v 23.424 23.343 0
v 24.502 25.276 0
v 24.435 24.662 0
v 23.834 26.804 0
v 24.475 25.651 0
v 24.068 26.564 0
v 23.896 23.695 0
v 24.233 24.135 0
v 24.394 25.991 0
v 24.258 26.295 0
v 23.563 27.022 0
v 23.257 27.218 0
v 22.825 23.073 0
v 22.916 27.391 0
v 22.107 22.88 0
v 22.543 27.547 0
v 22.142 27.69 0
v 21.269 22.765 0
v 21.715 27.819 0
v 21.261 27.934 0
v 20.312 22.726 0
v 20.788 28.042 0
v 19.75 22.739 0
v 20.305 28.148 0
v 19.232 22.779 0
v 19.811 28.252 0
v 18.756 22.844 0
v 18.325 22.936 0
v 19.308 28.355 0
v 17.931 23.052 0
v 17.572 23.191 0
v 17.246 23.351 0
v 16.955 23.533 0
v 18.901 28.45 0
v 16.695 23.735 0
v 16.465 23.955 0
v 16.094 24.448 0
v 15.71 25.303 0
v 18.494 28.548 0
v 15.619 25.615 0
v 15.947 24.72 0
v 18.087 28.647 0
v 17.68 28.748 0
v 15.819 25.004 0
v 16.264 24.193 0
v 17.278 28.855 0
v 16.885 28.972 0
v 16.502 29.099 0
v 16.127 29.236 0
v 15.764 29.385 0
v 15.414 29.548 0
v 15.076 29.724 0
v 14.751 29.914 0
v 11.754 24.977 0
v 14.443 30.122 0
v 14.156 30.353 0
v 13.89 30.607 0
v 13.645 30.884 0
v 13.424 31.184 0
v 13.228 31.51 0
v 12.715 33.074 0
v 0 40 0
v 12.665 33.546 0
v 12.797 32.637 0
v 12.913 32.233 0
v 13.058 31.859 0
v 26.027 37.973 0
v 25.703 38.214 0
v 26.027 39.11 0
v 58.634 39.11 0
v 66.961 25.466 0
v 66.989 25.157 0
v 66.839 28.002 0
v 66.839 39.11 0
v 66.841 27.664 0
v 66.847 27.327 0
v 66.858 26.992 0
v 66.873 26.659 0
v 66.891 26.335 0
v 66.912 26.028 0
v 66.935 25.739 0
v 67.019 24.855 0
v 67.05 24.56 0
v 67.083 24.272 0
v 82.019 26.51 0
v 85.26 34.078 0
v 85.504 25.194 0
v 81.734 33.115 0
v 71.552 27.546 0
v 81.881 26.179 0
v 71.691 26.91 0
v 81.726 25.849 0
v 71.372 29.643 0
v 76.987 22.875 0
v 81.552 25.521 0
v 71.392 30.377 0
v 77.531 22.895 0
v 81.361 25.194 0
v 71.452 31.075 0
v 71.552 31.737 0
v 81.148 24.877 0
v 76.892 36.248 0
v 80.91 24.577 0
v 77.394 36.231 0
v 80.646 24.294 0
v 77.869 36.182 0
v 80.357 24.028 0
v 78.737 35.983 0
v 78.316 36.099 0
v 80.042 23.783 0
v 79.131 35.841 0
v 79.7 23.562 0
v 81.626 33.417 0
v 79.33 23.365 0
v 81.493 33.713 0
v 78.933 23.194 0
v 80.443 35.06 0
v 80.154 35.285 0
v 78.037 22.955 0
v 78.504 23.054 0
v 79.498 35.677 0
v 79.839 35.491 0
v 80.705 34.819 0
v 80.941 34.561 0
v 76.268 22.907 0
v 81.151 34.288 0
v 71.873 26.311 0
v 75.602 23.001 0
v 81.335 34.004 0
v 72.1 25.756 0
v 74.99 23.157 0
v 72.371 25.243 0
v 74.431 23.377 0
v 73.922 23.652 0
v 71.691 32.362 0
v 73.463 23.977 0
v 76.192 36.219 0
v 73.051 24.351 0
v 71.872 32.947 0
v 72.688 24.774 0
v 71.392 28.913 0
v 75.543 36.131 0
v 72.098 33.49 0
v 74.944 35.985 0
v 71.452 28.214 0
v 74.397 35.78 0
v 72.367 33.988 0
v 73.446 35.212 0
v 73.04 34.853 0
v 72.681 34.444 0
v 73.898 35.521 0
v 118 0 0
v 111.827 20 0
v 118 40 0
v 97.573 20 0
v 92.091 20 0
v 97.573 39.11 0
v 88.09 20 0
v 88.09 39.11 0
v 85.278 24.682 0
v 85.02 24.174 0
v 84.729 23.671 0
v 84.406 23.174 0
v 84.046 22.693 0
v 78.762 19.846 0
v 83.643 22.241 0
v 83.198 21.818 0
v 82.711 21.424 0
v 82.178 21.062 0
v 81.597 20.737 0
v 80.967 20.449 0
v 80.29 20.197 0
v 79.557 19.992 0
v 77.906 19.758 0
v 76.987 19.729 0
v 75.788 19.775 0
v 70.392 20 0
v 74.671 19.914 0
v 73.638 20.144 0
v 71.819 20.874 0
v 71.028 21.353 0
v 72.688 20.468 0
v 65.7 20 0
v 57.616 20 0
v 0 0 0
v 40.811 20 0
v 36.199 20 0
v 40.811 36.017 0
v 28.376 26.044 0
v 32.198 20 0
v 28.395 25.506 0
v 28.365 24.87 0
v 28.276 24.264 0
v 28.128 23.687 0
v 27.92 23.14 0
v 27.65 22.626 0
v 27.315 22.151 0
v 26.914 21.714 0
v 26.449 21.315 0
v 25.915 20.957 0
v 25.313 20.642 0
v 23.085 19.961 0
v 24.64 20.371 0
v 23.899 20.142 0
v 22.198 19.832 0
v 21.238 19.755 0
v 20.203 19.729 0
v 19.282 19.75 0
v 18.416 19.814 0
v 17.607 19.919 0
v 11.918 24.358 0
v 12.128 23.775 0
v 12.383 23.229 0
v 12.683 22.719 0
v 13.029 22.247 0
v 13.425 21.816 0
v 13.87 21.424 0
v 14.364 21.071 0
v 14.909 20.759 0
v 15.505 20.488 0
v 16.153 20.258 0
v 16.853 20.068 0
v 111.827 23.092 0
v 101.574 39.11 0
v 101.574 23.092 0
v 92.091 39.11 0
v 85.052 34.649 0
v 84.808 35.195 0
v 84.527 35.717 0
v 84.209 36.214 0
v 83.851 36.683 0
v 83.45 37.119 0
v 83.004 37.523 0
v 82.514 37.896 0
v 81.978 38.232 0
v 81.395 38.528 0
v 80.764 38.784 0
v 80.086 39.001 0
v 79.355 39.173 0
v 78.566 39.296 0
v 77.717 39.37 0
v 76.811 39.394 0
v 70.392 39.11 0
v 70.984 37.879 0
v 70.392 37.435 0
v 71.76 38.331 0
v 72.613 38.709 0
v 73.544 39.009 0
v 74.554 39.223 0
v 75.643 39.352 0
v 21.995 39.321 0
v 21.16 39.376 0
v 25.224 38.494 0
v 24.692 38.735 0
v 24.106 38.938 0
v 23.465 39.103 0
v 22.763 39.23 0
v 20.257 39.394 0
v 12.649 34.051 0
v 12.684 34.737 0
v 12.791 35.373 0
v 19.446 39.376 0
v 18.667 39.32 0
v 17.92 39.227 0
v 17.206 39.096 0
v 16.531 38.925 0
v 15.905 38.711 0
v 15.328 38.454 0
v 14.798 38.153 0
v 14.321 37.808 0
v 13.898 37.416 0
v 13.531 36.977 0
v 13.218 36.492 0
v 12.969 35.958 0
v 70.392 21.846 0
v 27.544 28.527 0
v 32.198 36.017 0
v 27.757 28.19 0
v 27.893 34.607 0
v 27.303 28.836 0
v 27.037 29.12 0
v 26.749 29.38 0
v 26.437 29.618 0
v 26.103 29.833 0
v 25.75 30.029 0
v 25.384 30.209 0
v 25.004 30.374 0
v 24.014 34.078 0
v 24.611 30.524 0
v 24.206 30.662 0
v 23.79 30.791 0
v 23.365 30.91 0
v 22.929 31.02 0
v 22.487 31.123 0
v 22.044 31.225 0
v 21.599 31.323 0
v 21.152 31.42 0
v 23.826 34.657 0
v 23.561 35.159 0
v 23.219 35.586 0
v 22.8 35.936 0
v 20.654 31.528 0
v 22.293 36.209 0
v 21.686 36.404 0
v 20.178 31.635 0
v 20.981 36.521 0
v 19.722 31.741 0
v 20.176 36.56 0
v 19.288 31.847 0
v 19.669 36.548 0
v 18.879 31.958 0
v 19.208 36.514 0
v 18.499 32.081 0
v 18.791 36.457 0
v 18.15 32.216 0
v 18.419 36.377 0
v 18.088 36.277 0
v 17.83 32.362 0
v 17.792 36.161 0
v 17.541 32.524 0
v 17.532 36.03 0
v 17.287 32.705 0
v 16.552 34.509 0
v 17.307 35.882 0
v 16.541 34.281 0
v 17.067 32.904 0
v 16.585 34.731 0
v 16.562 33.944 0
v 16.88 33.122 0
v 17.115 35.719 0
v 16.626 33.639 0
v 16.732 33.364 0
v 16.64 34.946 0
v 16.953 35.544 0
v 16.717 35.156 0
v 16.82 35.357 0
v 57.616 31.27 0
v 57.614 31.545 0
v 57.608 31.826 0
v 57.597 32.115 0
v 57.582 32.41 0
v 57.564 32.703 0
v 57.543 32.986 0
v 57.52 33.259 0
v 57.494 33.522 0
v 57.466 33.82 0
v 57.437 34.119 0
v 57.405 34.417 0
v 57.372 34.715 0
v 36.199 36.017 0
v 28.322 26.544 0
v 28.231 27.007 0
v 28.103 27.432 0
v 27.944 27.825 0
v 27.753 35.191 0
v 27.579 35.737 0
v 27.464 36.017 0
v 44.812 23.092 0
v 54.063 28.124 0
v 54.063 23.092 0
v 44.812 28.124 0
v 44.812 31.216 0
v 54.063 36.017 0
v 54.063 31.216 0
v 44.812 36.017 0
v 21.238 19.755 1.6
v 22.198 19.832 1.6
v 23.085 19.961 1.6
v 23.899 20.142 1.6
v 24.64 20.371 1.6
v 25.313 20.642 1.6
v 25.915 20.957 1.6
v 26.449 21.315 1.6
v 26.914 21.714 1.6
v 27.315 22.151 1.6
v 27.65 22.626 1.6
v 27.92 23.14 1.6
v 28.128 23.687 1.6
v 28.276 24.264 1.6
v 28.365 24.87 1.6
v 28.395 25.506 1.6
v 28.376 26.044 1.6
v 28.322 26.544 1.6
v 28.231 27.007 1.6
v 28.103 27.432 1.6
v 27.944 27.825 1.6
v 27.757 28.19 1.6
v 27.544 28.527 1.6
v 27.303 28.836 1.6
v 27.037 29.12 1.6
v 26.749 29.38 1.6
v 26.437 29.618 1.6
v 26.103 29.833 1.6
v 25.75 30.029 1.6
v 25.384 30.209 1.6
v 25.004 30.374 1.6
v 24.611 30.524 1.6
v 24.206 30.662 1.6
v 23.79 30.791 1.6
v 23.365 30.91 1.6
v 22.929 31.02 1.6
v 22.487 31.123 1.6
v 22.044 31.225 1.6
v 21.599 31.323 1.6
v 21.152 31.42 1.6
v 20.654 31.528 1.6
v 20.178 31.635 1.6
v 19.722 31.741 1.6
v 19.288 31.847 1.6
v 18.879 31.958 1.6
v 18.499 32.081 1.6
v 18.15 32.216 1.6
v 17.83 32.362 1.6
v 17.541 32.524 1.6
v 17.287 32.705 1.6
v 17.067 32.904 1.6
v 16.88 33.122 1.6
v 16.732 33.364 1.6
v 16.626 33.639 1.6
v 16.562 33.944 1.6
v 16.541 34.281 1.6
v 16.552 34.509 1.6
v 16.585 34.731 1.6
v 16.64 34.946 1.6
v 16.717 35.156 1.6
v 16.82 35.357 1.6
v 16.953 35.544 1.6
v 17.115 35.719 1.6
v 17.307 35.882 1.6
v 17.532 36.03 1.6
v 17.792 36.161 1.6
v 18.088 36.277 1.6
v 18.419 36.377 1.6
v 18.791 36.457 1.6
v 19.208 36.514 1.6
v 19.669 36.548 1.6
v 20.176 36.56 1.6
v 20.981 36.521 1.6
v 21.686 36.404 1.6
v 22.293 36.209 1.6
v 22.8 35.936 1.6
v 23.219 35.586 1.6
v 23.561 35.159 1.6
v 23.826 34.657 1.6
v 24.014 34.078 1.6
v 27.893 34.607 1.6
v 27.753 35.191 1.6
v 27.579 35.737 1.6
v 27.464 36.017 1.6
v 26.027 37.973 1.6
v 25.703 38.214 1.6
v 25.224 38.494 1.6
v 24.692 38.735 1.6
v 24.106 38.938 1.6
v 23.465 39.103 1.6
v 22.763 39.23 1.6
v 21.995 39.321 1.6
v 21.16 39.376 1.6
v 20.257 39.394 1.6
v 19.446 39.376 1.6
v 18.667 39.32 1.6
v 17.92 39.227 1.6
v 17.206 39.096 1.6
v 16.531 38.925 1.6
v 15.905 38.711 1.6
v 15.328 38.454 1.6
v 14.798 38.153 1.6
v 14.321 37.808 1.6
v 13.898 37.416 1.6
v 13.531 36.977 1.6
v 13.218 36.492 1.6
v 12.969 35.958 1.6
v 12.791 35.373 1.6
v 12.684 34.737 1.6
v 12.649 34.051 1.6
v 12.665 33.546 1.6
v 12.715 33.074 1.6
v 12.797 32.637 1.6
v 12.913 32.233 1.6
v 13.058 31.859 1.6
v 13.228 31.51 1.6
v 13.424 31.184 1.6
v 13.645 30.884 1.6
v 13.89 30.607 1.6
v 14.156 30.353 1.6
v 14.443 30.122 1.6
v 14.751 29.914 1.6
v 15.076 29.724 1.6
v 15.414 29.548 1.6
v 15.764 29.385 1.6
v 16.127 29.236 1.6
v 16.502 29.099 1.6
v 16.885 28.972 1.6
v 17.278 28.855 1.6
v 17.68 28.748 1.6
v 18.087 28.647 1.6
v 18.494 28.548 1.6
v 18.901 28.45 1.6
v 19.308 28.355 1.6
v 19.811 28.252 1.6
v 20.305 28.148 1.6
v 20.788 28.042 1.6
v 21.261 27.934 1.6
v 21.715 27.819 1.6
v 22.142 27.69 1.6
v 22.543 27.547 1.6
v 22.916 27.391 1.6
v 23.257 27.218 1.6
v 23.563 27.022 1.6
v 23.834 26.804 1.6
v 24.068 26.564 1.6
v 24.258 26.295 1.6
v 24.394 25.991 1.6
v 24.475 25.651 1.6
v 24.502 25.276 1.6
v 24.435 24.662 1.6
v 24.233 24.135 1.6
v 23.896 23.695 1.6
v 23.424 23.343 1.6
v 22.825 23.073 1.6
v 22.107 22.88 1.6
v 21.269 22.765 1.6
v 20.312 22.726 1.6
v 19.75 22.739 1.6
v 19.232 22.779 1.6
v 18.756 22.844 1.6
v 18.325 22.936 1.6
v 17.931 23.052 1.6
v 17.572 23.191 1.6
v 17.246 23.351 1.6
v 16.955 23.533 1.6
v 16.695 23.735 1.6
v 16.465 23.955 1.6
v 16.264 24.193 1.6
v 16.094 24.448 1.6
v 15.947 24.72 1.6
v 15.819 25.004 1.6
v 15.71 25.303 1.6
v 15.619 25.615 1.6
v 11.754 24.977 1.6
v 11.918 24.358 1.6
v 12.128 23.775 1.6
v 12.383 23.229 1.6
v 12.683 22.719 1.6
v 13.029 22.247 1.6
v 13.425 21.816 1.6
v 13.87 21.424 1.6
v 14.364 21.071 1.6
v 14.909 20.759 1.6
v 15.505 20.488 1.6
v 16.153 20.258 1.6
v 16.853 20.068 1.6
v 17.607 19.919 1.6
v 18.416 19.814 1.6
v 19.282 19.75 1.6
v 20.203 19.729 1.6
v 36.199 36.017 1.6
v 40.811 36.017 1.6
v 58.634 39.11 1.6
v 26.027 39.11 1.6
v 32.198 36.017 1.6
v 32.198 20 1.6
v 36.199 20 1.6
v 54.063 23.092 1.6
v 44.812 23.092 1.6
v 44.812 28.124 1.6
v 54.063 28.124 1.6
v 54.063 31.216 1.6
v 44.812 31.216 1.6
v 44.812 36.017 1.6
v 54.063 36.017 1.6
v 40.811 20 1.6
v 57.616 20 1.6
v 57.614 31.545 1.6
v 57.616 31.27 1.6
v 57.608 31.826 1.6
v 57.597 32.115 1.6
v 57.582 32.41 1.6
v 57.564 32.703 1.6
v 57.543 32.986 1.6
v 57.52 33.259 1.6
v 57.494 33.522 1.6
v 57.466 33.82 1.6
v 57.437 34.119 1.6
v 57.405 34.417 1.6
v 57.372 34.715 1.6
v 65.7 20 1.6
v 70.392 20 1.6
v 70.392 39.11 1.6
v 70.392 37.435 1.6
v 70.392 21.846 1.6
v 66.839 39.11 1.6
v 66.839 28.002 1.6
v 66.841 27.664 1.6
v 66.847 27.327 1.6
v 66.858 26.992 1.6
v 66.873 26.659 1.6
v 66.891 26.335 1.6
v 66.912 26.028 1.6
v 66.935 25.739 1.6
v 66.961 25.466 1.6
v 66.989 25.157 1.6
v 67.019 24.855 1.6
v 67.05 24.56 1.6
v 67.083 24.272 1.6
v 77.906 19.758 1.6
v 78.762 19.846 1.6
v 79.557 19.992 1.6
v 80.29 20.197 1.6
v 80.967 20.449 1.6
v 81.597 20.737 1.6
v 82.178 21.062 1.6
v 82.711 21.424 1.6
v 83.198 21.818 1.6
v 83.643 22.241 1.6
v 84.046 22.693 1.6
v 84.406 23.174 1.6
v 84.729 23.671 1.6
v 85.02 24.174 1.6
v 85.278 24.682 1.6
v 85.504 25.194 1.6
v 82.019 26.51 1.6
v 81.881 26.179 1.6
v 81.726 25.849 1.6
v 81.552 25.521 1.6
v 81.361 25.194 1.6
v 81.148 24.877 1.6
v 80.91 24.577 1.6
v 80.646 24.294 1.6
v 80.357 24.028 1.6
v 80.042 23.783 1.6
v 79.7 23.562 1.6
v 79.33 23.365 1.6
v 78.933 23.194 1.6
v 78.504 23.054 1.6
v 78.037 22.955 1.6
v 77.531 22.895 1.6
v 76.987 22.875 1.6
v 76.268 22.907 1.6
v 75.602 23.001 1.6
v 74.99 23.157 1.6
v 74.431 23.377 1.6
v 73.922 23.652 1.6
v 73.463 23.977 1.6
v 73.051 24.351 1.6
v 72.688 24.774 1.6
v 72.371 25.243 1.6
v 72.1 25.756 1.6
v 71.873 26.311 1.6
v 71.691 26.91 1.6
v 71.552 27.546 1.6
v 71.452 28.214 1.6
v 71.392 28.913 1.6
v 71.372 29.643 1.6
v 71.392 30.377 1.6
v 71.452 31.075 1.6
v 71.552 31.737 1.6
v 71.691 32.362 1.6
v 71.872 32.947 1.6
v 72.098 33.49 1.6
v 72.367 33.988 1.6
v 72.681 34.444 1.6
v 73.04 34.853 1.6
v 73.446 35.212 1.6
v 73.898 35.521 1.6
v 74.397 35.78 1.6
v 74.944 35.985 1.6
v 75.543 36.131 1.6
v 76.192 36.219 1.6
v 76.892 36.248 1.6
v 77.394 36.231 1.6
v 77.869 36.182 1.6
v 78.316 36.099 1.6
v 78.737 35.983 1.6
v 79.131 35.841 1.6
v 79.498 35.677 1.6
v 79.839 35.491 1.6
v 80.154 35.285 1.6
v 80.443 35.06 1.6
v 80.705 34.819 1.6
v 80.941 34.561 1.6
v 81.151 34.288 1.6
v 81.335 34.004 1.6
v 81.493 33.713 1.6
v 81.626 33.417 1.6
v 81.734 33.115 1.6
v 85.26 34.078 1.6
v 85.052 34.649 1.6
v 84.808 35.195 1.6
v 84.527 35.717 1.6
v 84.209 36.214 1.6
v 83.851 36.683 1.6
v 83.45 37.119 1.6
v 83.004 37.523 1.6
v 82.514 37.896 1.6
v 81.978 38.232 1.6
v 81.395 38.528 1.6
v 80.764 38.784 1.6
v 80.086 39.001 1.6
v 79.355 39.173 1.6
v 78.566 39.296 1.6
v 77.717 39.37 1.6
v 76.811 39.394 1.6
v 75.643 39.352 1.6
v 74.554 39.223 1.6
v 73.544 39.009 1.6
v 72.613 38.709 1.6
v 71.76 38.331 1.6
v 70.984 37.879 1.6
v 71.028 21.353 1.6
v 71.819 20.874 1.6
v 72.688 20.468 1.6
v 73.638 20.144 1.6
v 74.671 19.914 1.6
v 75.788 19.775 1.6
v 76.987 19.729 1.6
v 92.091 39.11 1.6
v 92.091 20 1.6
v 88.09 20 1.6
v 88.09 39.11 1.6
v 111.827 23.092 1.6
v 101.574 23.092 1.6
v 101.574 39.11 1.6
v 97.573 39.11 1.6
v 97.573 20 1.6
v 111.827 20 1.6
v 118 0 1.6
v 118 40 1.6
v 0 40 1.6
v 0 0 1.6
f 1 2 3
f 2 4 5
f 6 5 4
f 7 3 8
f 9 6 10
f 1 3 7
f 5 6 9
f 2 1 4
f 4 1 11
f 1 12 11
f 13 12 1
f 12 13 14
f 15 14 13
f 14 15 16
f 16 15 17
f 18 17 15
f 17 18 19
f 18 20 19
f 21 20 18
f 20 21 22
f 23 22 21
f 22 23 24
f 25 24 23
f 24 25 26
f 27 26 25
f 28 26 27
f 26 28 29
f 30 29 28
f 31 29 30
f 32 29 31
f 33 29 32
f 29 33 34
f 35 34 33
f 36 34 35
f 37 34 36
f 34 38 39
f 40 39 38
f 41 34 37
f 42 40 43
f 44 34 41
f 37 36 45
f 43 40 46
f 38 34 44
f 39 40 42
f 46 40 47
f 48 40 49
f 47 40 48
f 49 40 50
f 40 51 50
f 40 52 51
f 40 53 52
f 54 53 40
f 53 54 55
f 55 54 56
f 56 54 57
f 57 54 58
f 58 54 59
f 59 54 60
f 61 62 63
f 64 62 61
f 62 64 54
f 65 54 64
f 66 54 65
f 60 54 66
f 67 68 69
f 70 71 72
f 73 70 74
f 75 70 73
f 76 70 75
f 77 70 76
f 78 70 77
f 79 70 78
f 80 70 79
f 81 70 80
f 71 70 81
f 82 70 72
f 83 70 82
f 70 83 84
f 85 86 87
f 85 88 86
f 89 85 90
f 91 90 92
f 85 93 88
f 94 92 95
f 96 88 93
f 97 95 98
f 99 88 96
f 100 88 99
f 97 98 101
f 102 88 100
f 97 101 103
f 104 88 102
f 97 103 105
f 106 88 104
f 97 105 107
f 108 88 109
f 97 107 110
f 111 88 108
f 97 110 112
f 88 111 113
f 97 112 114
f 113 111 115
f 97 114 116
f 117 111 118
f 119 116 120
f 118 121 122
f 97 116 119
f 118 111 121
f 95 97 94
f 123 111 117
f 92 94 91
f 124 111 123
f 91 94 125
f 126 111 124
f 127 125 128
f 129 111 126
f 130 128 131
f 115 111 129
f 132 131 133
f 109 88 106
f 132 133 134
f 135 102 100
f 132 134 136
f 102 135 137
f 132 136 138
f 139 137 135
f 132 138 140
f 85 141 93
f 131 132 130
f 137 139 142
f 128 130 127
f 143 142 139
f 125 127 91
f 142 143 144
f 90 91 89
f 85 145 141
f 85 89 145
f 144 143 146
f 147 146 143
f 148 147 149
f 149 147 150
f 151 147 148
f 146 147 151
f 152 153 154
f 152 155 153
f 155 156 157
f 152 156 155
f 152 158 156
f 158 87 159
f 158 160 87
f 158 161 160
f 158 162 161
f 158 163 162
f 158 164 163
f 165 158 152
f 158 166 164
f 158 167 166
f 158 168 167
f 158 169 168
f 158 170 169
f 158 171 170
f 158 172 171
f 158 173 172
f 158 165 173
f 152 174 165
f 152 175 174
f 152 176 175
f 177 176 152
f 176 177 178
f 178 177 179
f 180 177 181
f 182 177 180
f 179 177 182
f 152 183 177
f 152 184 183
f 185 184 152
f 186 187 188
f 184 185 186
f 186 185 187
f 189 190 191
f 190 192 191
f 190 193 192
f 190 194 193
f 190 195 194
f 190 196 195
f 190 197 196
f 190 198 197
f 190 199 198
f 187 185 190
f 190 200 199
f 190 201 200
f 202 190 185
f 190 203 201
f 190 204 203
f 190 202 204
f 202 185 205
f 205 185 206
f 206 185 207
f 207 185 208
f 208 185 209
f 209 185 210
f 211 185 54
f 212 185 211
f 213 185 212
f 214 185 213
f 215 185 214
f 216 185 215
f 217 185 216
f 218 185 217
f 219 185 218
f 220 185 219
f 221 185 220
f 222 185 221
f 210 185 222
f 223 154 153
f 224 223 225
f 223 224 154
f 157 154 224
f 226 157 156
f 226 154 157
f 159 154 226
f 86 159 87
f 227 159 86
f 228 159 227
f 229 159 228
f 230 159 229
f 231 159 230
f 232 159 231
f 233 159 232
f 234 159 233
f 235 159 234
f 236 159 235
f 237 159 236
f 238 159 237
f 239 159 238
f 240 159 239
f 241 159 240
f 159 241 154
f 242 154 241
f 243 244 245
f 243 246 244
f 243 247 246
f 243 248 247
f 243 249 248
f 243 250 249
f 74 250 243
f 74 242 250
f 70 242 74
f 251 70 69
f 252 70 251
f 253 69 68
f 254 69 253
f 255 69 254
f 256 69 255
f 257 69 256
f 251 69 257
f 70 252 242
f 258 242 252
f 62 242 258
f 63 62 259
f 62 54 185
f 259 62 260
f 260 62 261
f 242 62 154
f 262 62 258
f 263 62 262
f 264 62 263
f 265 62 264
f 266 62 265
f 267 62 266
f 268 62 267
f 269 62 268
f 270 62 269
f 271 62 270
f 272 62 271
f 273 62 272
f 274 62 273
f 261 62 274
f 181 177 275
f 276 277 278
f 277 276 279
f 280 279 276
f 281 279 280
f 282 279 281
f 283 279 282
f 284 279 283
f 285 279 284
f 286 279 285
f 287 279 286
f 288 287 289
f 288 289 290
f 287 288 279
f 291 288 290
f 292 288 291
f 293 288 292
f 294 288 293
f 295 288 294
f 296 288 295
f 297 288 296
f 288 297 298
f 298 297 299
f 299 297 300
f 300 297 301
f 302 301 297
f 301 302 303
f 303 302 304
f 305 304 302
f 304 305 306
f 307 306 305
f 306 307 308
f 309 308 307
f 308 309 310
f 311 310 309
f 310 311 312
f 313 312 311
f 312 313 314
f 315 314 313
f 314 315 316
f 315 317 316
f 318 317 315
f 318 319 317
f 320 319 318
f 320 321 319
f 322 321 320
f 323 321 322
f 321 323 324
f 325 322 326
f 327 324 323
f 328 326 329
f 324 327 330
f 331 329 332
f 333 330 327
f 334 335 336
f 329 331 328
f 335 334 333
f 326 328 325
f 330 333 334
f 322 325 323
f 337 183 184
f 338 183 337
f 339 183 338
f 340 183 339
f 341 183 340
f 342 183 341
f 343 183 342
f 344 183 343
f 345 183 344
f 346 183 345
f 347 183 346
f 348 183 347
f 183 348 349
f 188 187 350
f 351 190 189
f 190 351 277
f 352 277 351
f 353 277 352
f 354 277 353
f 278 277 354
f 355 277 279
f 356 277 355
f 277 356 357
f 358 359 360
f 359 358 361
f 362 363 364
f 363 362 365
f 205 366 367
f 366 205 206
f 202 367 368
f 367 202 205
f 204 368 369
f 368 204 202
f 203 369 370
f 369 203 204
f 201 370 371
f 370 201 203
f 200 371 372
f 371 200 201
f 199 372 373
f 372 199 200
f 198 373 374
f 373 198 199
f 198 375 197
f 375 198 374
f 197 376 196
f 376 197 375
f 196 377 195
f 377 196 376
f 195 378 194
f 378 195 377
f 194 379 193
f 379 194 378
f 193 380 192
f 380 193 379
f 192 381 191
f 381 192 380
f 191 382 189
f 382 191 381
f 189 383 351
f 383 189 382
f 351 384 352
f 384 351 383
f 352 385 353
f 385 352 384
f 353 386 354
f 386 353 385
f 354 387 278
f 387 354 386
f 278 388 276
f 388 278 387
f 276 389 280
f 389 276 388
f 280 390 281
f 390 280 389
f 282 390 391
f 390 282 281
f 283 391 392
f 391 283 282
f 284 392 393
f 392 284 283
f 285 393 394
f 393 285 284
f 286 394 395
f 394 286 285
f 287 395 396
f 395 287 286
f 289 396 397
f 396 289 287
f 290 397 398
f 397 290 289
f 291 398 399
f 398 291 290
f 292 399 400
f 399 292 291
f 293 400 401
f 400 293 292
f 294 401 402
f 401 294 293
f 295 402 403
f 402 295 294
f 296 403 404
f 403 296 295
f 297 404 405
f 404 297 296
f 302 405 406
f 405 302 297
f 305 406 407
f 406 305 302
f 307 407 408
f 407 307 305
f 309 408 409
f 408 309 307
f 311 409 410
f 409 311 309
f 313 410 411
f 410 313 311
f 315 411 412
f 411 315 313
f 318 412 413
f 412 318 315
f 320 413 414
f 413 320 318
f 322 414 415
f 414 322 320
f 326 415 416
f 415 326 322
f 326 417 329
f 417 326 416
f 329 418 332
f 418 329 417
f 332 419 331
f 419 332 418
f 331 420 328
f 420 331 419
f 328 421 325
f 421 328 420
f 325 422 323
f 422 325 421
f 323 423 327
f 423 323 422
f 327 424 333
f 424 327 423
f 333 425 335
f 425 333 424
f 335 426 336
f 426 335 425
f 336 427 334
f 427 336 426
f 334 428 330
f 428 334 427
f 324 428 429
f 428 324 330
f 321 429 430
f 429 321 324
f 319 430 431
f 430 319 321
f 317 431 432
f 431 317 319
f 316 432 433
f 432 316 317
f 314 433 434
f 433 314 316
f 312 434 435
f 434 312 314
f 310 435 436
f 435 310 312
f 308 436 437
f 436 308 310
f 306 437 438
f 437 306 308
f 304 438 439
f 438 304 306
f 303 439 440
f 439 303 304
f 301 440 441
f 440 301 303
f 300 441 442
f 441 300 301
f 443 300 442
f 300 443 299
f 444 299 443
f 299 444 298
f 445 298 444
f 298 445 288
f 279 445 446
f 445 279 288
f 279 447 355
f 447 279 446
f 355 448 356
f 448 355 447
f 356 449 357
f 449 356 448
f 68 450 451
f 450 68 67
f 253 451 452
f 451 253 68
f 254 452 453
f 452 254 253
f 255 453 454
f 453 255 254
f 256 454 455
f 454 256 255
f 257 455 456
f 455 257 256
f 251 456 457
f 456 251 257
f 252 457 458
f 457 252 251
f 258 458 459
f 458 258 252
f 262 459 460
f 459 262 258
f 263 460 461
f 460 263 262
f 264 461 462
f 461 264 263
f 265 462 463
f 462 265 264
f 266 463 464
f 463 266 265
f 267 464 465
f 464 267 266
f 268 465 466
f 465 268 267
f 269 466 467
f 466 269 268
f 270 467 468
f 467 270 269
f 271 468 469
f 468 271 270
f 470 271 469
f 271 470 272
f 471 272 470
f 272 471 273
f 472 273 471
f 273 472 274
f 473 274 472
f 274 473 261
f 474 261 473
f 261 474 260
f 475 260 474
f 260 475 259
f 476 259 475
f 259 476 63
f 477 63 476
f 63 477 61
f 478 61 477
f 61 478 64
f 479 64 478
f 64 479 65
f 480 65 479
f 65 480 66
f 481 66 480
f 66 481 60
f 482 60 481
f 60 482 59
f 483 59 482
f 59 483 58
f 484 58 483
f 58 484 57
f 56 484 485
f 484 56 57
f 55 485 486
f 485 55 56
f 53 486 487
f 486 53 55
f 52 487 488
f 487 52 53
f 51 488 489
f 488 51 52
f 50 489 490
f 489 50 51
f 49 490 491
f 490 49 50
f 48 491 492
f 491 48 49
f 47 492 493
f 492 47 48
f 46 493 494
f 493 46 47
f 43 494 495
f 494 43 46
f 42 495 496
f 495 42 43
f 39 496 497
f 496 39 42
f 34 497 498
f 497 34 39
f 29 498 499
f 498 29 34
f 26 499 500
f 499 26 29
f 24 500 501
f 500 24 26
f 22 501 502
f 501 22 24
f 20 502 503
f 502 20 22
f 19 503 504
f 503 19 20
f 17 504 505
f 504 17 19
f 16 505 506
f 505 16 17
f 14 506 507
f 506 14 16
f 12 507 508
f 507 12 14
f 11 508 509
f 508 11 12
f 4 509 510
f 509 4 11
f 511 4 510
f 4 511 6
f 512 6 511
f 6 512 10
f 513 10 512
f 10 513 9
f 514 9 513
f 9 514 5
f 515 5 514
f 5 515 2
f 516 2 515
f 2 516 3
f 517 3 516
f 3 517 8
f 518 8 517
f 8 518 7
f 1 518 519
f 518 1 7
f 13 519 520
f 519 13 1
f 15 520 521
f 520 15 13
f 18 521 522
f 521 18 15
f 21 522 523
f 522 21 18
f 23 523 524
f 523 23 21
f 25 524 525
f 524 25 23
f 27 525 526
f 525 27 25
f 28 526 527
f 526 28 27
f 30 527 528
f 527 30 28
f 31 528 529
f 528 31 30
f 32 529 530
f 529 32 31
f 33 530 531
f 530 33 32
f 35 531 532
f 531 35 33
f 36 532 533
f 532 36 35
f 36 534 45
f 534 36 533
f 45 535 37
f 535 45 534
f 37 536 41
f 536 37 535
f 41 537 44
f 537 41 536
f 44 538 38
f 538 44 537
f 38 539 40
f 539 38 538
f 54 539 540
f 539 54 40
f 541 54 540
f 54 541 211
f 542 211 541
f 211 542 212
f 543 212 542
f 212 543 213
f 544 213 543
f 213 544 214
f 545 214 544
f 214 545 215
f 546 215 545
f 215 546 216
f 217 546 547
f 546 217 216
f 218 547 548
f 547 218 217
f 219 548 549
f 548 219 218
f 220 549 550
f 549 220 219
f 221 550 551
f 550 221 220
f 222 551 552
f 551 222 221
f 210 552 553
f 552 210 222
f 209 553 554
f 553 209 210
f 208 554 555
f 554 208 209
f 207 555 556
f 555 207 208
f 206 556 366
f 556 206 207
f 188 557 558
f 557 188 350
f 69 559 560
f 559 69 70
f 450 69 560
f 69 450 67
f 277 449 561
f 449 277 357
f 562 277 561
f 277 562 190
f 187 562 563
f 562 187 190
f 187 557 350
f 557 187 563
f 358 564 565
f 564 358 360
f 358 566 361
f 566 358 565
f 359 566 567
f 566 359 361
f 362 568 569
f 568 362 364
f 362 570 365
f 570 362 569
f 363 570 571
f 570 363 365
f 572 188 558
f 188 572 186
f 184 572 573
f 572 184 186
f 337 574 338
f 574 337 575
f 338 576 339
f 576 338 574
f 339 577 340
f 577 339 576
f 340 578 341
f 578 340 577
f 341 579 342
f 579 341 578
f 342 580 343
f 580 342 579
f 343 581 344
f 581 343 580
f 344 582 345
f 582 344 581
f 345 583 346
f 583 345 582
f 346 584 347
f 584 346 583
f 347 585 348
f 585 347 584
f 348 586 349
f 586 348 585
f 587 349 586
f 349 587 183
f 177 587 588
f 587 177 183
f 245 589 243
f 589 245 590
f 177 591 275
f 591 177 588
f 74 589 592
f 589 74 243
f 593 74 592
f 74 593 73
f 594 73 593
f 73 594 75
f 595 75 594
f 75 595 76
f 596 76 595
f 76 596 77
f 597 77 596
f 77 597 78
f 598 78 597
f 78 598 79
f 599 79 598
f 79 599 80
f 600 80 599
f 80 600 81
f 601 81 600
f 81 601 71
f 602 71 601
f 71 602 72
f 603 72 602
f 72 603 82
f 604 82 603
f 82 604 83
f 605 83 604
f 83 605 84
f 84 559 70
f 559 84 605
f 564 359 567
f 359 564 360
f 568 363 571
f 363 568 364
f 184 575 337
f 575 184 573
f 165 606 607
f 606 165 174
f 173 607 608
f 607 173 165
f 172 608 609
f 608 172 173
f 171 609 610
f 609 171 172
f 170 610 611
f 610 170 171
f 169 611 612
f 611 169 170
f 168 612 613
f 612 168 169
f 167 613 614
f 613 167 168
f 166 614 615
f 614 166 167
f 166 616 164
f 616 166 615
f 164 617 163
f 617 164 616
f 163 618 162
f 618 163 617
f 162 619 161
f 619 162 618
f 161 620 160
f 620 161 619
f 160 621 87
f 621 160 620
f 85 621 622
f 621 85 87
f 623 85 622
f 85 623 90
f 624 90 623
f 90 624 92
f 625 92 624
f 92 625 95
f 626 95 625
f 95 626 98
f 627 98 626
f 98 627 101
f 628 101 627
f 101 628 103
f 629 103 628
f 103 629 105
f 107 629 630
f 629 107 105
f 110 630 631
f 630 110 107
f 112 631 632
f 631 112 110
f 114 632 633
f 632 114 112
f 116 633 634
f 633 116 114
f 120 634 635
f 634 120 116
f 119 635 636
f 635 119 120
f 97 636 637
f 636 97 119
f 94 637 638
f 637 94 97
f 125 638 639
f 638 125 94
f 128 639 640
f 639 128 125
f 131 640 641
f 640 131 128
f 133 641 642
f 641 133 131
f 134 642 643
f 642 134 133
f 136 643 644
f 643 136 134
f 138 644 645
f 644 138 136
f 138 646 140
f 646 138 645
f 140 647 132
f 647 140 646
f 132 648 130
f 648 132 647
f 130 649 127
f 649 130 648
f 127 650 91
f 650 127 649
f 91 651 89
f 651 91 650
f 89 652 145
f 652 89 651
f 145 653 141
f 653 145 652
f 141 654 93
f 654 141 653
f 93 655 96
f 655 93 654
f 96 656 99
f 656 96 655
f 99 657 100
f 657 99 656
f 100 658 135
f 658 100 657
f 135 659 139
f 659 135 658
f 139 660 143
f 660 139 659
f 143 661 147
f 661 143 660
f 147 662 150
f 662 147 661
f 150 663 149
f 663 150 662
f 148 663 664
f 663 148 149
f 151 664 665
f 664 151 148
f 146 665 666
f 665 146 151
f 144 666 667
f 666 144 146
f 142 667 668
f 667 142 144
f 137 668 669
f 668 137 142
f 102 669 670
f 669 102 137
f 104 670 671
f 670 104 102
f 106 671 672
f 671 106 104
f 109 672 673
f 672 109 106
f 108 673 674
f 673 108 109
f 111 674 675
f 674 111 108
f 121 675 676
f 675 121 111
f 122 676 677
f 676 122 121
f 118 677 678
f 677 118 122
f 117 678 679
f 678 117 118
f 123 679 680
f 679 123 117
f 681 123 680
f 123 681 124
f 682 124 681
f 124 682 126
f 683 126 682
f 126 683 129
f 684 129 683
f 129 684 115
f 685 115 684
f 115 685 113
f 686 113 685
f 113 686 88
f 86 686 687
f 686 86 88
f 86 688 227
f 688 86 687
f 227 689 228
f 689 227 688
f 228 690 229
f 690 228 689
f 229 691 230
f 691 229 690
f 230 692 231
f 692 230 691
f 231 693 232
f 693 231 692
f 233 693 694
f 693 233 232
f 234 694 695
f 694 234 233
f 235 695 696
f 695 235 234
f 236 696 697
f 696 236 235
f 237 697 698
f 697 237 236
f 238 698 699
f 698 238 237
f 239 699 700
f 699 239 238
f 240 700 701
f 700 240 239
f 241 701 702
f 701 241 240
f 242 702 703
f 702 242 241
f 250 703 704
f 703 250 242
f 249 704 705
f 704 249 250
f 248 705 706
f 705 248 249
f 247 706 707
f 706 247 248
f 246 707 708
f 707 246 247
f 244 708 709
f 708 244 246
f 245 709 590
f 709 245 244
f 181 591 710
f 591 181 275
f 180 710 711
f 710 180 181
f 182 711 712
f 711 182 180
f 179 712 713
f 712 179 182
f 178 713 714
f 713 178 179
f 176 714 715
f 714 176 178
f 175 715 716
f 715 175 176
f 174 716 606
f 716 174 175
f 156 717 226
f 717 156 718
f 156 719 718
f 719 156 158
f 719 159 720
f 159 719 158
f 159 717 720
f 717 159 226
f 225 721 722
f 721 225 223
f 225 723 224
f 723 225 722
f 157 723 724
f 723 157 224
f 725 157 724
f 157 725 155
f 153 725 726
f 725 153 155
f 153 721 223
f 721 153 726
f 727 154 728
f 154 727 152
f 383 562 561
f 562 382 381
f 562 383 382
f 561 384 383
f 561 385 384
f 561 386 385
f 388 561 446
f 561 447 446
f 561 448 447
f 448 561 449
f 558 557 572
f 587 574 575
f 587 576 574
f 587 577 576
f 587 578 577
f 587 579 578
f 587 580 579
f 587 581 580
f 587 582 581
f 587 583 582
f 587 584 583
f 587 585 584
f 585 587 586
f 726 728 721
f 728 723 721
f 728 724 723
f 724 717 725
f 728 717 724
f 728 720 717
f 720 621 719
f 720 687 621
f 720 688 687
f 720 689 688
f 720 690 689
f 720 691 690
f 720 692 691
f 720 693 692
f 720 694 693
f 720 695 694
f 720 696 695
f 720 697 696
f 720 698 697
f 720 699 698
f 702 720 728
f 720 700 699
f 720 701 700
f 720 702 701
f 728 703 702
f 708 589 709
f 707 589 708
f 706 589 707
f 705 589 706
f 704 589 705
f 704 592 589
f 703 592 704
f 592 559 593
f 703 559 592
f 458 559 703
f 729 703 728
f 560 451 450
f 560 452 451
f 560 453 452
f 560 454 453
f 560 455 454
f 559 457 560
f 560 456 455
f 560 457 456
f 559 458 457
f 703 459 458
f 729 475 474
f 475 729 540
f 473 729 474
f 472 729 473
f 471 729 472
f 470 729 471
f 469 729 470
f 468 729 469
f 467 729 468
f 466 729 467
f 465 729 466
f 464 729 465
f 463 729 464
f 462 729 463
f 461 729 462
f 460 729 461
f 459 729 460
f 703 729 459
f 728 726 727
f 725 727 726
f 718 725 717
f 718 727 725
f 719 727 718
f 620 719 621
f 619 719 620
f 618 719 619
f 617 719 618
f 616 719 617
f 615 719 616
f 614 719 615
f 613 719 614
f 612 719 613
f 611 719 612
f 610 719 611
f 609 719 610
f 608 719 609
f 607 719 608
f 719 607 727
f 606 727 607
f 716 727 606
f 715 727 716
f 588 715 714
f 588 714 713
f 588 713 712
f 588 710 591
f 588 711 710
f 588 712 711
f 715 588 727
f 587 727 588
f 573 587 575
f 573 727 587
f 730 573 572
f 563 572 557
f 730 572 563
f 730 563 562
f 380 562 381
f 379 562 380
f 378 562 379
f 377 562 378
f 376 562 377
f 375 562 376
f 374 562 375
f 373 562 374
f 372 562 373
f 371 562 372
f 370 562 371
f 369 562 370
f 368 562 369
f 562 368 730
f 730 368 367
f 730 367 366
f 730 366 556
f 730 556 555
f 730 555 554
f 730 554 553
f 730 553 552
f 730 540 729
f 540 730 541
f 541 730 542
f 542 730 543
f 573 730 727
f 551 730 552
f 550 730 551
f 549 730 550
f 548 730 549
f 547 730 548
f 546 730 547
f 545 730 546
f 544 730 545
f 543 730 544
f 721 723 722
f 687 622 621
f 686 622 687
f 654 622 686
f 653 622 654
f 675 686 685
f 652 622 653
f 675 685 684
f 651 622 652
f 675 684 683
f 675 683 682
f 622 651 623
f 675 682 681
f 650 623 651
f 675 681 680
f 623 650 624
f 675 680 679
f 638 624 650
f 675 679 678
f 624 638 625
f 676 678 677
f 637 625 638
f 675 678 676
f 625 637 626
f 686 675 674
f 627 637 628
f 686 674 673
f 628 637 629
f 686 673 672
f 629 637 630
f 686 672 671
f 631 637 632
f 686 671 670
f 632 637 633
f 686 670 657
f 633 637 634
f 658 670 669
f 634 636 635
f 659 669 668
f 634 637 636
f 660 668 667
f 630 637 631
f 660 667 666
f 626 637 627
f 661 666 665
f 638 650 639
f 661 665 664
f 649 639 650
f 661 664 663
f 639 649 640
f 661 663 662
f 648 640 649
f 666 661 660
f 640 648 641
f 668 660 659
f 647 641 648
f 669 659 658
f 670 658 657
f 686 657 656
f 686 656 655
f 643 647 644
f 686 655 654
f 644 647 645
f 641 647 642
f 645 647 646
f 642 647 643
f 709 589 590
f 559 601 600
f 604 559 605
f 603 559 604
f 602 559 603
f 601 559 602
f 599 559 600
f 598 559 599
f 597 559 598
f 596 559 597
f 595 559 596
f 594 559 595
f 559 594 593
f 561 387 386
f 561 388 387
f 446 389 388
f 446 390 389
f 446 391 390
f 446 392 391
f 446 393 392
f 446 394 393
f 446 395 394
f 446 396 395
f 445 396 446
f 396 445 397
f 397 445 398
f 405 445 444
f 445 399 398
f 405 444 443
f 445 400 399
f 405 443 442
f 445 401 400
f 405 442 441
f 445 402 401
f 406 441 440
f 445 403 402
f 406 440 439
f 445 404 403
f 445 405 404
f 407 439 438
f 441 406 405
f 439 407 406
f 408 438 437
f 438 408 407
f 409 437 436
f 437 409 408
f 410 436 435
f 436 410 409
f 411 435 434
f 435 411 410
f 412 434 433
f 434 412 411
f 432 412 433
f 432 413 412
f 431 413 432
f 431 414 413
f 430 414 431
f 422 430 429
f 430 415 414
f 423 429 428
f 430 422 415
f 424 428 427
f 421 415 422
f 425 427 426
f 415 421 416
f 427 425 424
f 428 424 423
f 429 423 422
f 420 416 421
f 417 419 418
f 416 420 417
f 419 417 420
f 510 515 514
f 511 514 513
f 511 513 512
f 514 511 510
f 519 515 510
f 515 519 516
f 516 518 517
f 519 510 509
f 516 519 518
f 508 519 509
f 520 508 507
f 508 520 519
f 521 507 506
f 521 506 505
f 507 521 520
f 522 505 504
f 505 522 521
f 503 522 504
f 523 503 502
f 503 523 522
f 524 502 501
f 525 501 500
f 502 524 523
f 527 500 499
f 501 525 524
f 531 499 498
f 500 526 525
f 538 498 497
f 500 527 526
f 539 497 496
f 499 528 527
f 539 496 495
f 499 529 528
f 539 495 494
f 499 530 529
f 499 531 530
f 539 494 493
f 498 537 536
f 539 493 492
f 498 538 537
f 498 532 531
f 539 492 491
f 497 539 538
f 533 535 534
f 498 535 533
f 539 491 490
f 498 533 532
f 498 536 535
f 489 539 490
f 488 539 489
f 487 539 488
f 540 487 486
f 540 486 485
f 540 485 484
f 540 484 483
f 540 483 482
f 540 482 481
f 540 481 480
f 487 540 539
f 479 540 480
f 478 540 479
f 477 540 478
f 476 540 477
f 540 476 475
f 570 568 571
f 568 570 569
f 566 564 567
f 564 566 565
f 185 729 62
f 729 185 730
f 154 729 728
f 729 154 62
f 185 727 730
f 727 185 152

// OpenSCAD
// --- User Parameters ---
message = "STENCIL";
font_size = 20;
stencil_thickness = 1.6; // 8 layers at 0.2mm - very rigid
bridge_fatness = 1.8;    // Thick enough for 4-5 nozzle passes
margin = 10;             // Extra plastic around the text
font_name = "Liberation Sans:style=Bold";

// --- The Assembly ---
difference() {
    // 1. The Physical Plate
    stencil_plate();

    // 2. The Text Cutouts
    translate([margin, margin + (font_size/2), 0])
        stencil_text(message);
}

// --- Modules ---
module stencil_plate() {
    plate_width = (len(message) * font_size * 0.7) + (margin * 2);
    plate_height = font_size + (margin * 2);
    
    cube([plate_width, plate_height, stencil_thickness]);
}

module stencil_text(txt) {
    for (i = [0 : len(txt) - 1]) {
        translate([i * font_size * 0.7 + (font_size/2), 0, 0]) {
            char = txt[i];
            difference() {
                // The Letter Hole
                linear_extrude(height = stencil_thickness + 2)
                    text(char, size = font_size, font = font_name, halign = "center");

                // The Reinforcing Bridges (We "add" material back into the hole)
                if (search(char, "AMUVWYH") != [])  bridge_geometry(0); 
                if (search(char, "BDOPQR0689") != []) bridge_geometry(90);
                if (search(char, "ODQ0") != []) bridge_geometry(0);
            }
        }
    }
}

module bridge_geometry(angle) {
    rotate([0, 0, angle])
        cube([bridge_fatness, font_size * 2, stencil_thickness * 3], center = true);
}
